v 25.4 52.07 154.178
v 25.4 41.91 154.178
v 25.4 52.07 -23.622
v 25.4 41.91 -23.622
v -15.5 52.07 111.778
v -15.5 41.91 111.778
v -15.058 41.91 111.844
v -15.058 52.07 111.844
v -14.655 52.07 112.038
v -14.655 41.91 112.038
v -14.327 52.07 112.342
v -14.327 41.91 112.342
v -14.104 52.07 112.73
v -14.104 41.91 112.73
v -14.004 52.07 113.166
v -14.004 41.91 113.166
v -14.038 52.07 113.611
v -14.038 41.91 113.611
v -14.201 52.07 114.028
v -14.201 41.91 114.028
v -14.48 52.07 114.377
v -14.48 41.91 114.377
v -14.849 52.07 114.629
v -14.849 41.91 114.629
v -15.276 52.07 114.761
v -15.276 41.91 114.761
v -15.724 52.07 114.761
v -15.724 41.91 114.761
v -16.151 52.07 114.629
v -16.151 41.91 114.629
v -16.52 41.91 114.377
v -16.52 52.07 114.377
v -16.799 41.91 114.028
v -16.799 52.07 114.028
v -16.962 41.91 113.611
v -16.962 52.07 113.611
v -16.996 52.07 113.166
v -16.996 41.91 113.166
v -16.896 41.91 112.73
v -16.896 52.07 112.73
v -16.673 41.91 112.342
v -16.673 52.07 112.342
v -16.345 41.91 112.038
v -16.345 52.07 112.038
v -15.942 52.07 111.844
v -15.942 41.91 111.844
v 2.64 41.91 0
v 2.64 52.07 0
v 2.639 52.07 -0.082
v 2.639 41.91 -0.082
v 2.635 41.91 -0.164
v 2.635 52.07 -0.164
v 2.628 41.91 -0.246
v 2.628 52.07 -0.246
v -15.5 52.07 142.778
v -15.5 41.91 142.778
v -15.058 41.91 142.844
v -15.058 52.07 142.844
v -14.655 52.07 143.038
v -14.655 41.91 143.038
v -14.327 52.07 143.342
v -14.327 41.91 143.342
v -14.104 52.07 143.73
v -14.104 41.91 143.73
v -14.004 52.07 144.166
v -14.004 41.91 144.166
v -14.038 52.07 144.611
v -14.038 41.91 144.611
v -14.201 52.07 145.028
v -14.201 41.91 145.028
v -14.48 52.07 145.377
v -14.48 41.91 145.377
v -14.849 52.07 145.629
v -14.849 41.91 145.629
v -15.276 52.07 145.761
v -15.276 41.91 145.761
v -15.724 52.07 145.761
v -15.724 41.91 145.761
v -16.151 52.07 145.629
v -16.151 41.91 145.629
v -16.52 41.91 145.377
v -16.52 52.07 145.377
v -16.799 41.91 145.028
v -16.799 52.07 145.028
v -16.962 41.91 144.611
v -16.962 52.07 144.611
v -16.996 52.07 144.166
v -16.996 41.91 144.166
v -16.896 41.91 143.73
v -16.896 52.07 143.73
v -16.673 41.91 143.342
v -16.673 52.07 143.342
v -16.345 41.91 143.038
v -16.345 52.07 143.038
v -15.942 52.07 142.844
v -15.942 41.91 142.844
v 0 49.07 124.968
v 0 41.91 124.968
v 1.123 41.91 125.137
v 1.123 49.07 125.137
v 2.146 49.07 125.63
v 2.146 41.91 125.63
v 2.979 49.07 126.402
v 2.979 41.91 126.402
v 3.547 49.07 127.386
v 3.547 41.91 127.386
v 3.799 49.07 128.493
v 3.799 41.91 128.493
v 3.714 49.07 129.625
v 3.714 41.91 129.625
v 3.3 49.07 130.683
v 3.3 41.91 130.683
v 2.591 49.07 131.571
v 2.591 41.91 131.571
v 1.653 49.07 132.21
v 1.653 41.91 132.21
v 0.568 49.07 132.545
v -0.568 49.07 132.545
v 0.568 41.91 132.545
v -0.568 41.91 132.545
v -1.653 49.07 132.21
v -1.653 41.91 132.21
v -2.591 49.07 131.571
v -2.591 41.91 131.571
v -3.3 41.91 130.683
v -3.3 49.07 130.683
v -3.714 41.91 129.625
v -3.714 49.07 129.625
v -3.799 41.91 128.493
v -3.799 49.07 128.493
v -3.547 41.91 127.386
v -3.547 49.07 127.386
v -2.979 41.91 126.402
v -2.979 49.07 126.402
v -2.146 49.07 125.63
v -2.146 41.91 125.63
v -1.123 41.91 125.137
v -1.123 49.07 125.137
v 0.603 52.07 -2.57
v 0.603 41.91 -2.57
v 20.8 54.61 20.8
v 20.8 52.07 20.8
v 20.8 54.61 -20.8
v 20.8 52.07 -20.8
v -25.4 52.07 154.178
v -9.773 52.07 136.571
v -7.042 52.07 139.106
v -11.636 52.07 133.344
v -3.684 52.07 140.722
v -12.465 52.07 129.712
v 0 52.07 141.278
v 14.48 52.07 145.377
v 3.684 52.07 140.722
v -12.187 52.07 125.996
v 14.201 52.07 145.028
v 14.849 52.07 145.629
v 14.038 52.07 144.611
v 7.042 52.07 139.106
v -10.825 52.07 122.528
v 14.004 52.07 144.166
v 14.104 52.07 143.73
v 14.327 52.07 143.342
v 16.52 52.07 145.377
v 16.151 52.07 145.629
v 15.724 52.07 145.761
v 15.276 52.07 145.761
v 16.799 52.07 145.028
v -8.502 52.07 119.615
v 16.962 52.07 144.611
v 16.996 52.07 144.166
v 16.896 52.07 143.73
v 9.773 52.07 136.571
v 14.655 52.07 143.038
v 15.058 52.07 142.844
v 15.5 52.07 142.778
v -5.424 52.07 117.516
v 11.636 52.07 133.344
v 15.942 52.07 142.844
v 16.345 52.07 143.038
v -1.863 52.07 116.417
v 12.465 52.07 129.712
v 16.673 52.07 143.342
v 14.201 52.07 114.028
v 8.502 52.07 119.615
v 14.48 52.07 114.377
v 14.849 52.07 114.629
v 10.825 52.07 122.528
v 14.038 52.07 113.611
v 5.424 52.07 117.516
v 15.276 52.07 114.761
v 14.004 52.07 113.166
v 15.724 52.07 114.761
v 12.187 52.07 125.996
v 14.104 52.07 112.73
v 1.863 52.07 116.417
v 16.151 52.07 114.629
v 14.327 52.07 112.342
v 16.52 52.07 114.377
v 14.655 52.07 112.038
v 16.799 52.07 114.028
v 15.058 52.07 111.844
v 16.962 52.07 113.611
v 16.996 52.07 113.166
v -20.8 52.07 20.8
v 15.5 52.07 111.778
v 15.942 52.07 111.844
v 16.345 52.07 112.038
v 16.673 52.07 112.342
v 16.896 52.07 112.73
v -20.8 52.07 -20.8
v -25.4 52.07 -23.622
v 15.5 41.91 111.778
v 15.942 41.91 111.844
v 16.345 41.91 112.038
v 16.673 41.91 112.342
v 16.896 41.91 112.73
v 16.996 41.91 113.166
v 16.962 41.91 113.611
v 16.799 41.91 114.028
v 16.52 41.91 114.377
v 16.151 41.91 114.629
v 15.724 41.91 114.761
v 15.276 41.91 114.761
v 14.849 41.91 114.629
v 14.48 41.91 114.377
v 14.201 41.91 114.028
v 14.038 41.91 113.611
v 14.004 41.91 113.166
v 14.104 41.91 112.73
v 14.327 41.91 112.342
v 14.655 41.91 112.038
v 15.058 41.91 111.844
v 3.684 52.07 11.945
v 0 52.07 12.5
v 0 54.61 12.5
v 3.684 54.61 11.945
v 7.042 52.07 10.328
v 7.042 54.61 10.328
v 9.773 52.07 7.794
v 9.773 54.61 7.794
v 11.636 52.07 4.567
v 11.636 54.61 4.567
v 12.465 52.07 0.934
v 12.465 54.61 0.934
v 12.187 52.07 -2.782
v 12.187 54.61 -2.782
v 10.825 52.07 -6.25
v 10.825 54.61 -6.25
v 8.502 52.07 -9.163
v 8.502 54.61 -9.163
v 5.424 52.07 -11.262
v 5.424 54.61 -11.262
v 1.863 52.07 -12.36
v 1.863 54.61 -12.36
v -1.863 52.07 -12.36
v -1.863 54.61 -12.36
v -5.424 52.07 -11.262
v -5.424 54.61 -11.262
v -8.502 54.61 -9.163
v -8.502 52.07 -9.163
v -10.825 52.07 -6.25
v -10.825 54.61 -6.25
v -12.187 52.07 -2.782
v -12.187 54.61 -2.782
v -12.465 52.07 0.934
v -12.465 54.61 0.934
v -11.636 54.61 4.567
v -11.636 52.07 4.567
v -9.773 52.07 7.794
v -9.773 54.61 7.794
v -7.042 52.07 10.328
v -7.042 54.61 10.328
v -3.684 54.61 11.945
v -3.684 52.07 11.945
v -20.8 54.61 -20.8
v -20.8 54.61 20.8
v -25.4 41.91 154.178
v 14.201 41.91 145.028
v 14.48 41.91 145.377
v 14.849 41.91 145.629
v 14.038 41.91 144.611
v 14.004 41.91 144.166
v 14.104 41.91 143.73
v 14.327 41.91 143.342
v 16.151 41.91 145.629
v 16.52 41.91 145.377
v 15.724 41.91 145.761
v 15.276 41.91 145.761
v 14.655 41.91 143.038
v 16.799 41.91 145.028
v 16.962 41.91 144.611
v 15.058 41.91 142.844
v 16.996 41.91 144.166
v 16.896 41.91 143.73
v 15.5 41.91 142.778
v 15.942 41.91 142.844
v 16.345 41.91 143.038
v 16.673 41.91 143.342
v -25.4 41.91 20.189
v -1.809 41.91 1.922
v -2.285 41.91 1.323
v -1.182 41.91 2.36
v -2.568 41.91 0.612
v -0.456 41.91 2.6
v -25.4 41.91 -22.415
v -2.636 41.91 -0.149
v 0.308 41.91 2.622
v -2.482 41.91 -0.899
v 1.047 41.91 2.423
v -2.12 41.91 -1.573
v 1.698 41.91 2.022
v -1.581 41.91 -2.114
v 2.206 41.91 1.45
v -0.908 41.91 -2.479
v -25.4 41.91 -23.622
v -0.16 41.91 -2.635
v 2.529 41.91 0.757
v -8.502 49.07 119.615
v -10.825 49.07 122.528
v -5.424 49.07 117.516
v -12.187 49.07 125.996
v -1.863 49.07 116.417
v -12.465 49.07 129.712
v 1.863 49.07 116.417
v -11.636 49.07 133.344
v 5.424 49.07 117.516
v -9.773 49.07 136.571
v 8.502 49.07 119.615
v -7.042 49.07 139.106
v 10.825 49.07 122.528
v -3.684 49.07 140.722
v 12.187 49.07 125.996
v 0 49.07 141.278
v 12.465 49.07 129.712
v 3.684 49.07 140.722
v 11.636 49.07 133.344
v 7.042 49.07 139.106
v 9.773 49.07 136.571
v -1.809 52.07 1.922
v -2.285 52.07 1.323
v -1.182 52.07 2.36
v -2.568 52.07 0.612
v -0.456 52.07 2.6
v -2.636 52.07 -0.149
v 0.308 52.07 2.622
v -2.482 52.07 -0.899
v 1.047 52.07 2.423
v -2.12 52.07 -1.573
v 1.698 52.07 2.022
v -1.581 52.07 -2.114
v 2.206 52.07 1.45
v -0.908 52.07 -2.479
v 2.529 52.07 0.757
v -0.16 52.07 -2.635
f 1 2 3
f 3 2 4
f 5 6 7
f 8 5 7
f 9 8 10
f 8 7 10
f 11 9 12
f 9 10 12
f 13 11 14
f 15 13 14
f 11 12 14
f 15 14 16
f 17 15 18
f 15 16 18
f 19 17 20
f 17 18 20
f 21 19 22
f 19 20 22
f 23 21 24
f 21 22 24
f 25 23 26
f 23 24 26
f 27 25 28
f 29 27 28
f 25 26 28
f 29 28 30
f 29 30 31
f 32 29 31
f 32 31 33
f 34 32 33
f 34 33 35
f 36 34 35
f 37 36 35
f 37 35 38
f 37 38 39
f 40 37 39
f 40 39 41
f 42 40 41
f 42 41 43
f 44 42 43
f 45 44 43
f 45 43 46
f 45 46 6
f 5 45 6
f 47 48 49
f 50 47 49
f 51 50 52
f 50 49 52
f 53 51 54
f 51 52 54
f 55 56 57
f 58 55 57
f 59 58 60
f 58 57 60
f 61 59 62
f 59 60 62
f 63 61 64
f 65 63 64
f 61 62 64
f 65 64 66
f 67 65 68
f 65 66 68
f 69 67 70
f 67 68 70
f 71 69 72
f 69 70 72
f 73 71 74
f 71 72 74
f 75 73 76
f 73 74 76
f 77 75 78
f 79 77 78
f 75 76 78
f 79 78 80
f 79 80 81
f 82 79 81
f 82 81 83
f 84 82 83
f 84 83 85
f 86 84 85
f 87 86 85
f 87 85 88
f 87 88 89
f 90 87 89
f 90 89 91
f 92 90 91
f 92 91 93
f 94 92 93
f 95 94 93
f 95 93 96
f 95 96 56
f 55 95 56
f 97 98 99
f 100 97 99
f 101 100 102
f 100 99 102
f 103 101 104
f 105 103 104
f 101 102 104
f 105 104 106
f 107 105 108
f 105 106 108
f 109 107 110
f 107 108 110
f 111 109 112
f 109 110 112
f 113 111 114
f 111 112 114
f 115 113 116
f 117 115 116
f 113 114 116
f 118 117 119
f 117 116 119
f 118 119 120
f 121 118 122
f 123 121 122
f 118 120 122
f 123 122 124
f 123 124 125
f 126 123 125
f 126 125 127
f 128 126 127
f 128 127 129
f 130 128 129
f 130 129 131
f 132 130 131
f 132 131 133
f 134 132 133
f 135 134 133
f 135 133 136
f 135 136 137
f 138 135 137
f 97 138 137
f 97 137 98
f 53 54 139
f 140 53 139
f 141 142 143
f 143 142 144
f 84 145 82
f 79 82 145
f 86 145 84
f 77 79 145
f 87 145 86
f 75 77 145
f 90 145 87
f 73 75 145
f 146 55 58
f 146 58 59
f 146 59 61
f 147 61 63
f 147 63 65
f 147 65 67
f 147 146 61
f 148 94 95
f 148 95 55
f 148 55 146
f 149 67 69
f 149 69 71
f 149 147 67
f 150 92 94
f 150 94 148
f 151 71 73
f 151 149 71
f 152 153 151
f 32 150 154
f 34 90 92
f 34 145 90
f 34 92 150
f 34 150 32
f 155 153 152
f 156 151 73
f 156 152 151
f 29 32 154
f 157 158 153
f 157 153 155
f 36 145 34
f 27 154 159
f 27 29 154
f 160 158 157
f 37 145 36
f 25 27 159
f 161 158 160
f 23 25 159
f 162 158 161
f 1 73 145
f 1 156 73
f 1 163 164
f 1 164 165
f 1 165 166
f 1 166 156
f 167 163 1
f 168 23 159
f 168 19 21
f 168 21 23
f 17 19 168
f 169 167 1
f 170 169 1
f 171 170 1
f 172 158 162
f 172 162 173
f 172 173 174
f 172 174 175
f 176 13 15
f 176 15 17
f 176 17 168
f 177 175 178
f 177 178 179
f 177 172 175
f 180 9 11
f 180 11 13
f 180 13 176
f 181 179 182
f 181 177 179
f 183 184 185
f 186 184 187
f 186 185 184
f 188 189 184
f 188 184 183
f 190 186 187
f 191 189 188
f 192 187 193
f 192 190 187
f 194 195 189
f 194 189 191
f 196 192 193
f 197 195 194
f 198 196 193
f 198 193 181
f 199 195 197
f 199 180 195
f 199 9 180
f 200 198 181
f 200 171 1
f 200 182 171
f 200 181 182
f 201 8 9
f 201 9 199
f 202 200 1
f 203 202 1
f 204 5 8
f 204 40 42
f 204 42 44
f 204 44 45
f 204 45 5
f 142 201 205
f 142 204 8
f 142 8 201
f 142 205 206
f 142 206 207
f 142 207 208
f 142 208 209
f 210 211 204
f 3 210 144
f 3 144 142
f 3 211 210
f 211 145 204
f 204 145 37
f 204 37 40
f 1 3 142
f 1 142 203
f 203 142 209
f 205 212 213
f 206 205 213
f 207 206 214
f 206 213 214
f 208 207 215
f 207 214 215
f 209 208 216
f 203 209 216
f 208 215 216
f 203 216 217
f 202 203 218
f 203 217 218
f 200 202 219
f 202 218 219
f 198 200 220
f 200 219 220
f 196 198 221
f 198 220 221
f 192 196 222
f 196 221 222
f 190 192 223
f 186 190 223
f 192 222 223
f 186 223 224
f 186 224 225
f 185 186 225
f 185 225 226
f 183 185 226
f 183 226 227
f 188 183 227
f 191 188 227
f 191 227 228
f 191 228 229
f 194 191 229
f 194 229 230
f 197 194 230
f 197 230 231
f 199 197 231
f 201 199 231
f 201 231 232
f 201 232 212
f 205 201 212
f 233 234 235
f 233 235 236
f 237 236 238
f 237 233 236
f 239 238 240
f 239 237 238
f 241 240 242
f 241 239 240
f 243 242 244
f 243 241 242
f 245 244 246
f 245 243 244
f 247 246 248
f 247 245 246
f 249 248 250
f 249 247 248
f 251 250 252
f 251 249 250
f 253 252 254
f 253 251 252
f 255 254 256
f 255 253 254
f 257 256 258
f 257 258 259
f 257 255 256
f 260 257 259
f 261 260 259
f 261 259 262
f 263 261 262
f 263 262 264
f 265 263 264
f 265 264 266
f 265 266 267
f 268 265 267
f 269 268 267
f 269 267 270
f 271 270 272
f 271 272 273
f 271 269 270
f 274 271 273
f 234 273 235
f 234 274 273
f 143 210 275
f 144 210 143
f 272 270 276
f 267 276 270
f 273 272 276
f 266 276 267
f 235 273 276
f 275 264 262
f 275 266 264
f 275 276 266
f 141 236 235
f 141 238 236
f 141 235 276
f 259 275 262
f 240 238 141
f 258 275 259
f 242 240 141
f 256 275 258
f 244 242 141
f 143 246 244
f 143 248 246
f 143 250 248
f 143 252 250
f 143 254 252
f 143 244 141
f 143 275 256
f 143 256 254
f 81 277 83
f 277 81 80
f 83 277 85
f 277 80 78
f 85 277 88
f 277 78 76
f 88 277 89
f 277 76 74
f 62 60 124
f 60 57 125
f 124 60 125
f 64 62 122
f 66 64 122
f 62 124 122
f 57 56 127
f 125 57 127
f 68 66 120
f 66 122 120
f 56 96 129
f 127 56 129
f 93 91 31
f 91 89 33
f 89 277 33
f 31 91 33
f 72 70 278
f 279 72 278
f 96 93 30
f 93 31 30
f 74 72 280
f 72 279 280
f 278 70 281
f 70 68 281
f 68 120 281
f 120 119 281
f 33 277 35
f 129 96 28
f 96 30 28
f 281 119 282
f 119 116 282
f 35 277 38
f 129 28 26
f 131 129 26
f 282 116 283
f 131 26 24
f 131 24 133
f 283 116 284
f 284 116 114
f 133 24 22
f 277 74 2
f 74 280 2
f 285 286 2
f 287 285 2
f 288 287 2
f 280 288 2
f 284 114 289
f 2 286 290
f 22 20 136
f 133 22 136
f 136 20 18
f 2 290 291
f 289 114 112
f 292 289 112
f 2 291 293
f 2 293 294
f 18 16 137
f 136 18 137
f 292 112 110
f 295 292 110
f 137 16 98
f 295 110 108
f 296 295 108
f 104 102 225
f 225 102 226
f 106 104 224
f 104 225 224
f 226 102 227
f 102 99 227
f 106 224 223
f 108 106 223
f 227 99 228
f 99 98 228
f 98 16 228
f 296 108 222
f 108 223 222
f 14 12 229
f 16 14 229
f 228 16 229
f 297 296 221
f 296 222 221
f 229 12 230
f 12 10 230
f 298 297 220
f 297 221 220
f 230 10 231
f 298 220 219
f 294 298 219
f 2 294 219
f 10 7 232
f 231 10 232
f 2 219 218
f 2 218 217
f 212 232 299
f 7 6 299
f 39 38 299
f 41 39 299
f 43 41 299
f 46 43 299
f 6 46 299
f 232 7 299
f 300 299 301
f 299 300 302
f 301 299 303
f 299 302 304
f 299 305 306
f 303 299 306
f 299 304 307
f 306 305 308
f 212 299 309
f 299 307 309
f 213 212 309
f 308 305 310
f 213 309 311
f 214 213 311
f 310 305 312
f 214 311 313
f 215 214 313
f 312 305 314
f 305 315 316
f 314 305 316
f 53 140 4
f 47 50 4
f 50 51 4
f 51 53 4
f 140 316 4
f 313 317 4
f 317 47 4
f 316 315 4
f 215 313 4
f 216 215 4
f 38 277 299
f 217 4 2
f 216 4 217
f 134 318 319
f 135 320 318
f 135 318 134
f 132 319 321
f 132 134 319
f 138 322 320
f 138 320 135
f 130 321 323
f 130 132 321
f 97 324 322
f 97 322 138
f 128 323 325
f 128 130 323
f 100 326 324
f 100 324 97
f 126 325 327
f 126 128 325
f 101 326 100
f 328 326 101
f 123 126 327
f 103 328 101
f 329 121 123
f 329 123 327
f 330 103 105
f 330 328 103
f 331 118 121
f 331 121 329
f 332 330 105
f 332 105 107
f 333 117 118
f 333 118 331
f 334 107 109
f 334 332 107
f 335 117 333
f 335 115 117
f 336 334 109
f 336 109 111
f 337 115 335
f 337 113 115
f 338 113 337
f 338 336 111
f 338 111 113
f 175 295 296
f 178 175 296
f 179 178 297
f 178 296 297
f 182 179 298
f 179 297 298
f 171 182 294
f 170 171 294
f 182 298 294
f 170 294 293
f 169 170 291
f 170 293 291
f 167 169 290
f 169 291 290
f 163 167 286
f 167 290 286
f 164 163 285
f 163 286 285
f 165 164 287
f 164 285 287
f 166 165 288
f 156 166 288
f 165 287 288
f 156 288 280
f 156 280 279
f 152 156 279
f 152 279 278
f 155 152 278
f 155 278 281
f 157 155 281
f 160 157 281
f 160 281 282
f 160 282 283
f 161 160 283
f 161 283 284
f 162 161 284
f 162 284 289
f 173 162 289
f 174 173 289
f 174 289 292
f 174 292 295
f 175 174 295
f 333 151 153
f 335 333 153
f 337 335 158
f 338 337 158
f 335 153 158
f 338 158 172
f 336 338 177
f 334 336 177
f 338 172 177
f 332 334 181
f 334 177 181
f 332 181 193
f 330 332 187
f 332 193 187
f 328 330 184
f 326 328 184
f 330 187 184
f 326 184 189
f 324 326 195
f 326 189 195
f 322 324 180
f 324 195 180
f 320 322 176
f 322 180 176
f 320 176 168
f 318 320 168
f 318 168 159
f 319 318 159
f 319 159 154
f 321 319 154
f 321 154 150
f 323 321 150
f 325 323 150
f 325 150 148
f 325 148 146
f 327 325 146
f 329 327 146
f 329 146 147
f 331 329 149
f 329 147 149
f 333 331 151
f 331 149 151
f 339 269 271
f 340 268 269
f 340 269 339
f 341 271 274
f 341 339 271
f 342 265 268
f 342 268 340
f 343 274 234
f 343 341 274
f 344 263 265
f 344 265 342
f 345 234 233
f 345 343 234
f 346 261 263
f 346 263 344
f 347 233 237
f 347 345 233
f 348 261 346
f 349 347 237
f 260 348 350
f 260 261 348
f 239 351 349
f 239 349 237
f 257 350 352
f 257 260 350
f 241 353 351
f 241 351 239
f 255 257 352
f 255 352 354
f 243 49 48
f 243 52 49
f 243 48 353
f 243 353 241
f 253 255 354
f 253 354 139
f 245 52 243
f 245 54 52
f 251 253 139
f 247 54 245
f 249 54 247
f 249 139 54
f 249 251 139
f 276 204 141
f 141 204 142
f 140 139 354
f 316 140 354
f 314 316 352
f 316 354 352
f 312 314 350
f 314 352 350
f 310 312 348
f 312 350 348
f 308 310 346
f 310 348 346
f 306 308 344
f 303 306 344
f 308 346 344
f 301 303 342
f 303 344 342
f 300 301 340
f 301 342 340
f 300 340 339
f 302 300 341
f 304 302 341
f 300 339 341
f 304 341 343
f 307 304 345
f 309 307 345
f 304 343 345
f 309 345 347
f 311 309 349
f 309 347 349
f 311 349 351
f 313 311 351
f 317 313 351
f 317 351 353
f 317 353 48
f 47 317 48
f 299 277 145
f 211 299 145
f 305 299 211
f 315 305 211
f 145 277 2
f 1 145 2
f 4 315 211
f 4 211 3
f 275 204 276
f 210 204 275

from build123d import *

# Parameters (mm, degrees)
SKETCH2_R           = 5.08
BOSS_EXTRUDE2_DEPTH = 41.91
SKETCH8_W           = 50.8
SKETCH8_H           = 177.8
BOSS_EXTRUDE3_DEPTH = 10.16
SKETCH11_W          = 41.599124914
SKETCH11_H          = 41.599124914
SKETCH11_R          = 12.5
BOSS_EXTRUDE6_DEPTH = 2.54
CUT_EXTRUDE1_DEPTH  = 25
SKETCH14_R          = 1.5
SKETCH14_R_2        = 3.81
CUT_EXTRUDE5_DEPTH  = 30.94
SKETCH18_R          = 12.5
CUT_EXTRUDE6_DEPTH  = 3
SKETCH19_W          = 42.604525883
SKETCH19_H          = 46.988260705
CUT_EXTRUDE7_DEPTH  = 85.804


with BuildPart() as part:
    # Sketch2 → Boss-Extrude2 (new body)
    with BuildSketch(Plane(origin=(0, 0, 0), x_dir=(-1, 0, 0), z_dir=(0, 1, 0))):
        with Locations(Location((0, 0, 0), (0, 0, 90))):
            Circle(SKETCH2_R)
    extrude(amount=BOSS_EXTRUDE2_DEPTH)

    # Sketch8 → Boss-Extrude3 (add)
    with BuildSketch(Plane(origin=(0, 41.91, 0), x_dir=(1, 0, 0), z_dir=(0, 1, 0))):
        with Locations((0, -65.27767655)):
            Rectangle(SKETCH8_W, SKETCH8_H)
    extrude(amount=BOSS_EXTRUDE3_DEPTH)

    # Sketch11 → Boss-Extrude6 (add)
    with BuildSketch(Plane(origin=(0, 52.07, 0), x_dir=(1, 0, 0), z_dir=(0, 1, 0))):
        Rectangle(SKETCH11_W, SKETCH11_H)
        with Locations(Location((0, 0, 0), (0, 0, 270))):
            Circle(SKETCH11_R, mode=Mode.SUBTRACT)
    extrude(amount=BOSS_EXTRUDE6_DEPTH)

    # Sketch12 → Cut-Extrude1 (cut)
    with BuildSketch(Plane(origin=(0, 52.07, 0), x_dir=(1, 0, 0), z_dir=(0, 1, 0))):
        with BuildLine():
            Line((2.628413525, 0.246153039), (0.602559077, 2.570227915))
            ThreePointArc((0.602559077, 2.570227915), (-2.068798379, -1.639884826), (2.639914577, 0))
            ThreePointArc((2.639914577, 0), (2.637037747, 0.123210788), (2.628413525, 0.246153039))
        make_face()
    extrude(amount=-CUT_EXTRUDE1_DEPTH, mode=Mode.SUBTRACT)

    # Sketch14 → Cut-Extrude5 (cut)
    with BuildSketch(Plane.XZ.offset(-41.91)):
        with Locations(Location((15.5, 144.27767655, 0), (0, 0, 270))):
            Circle(SKETCH14_R)
        with Locations(Location((0, 128.77767655, 0), (0, 0, 270))):
            Circle(SKETCH14_R_2)
        with Locations(Location((-15.5, 113.27767655, 0), (0, 0, 270))):
            Circle(SKETCH14_R)
        with Locations(Location((15.5, 113.27767655, 0), (0, 0, 270))):
            Circle(SKETCH14_R)
        with Locations(Location((-15.5, 144.27767655, 0), (0, 0, 270))):
            Circle(SKETCH14_R)
    extrude(amount=-CUT_EXTRUDE5_DEPTH, mode=Mode.SUBTRACT)

    # Sketch18 → Cut-Extrude6 (cut)
    with BuildSketch(Plane(origin=(0, 52.07, 0), x_dir=(1, 0, 0), z_dir=(0, 1, 0))):
        with Locations(Location((0, -128.77767655, 0), (0, 0, 270))):
            Circle(SKETCH18_R)
    extrude(amount=-CUT_EXTRUDE6_DEPTH, mode=Mode.SUBTRACT)

    # Sketch19 → Cut-Extrude7 (cut)
    with BuildSketch(Plane.ZY.offset(25.4)):
        with Locations((-1.112784187, 18.415869648)):
            Rectangle(SKETCH19_W, SKETCH19_H)
    extrude(amount=-CUT_EXTRUDE7_DEPTH, mode=Mode.SUBTRACT)


solid = part.part
